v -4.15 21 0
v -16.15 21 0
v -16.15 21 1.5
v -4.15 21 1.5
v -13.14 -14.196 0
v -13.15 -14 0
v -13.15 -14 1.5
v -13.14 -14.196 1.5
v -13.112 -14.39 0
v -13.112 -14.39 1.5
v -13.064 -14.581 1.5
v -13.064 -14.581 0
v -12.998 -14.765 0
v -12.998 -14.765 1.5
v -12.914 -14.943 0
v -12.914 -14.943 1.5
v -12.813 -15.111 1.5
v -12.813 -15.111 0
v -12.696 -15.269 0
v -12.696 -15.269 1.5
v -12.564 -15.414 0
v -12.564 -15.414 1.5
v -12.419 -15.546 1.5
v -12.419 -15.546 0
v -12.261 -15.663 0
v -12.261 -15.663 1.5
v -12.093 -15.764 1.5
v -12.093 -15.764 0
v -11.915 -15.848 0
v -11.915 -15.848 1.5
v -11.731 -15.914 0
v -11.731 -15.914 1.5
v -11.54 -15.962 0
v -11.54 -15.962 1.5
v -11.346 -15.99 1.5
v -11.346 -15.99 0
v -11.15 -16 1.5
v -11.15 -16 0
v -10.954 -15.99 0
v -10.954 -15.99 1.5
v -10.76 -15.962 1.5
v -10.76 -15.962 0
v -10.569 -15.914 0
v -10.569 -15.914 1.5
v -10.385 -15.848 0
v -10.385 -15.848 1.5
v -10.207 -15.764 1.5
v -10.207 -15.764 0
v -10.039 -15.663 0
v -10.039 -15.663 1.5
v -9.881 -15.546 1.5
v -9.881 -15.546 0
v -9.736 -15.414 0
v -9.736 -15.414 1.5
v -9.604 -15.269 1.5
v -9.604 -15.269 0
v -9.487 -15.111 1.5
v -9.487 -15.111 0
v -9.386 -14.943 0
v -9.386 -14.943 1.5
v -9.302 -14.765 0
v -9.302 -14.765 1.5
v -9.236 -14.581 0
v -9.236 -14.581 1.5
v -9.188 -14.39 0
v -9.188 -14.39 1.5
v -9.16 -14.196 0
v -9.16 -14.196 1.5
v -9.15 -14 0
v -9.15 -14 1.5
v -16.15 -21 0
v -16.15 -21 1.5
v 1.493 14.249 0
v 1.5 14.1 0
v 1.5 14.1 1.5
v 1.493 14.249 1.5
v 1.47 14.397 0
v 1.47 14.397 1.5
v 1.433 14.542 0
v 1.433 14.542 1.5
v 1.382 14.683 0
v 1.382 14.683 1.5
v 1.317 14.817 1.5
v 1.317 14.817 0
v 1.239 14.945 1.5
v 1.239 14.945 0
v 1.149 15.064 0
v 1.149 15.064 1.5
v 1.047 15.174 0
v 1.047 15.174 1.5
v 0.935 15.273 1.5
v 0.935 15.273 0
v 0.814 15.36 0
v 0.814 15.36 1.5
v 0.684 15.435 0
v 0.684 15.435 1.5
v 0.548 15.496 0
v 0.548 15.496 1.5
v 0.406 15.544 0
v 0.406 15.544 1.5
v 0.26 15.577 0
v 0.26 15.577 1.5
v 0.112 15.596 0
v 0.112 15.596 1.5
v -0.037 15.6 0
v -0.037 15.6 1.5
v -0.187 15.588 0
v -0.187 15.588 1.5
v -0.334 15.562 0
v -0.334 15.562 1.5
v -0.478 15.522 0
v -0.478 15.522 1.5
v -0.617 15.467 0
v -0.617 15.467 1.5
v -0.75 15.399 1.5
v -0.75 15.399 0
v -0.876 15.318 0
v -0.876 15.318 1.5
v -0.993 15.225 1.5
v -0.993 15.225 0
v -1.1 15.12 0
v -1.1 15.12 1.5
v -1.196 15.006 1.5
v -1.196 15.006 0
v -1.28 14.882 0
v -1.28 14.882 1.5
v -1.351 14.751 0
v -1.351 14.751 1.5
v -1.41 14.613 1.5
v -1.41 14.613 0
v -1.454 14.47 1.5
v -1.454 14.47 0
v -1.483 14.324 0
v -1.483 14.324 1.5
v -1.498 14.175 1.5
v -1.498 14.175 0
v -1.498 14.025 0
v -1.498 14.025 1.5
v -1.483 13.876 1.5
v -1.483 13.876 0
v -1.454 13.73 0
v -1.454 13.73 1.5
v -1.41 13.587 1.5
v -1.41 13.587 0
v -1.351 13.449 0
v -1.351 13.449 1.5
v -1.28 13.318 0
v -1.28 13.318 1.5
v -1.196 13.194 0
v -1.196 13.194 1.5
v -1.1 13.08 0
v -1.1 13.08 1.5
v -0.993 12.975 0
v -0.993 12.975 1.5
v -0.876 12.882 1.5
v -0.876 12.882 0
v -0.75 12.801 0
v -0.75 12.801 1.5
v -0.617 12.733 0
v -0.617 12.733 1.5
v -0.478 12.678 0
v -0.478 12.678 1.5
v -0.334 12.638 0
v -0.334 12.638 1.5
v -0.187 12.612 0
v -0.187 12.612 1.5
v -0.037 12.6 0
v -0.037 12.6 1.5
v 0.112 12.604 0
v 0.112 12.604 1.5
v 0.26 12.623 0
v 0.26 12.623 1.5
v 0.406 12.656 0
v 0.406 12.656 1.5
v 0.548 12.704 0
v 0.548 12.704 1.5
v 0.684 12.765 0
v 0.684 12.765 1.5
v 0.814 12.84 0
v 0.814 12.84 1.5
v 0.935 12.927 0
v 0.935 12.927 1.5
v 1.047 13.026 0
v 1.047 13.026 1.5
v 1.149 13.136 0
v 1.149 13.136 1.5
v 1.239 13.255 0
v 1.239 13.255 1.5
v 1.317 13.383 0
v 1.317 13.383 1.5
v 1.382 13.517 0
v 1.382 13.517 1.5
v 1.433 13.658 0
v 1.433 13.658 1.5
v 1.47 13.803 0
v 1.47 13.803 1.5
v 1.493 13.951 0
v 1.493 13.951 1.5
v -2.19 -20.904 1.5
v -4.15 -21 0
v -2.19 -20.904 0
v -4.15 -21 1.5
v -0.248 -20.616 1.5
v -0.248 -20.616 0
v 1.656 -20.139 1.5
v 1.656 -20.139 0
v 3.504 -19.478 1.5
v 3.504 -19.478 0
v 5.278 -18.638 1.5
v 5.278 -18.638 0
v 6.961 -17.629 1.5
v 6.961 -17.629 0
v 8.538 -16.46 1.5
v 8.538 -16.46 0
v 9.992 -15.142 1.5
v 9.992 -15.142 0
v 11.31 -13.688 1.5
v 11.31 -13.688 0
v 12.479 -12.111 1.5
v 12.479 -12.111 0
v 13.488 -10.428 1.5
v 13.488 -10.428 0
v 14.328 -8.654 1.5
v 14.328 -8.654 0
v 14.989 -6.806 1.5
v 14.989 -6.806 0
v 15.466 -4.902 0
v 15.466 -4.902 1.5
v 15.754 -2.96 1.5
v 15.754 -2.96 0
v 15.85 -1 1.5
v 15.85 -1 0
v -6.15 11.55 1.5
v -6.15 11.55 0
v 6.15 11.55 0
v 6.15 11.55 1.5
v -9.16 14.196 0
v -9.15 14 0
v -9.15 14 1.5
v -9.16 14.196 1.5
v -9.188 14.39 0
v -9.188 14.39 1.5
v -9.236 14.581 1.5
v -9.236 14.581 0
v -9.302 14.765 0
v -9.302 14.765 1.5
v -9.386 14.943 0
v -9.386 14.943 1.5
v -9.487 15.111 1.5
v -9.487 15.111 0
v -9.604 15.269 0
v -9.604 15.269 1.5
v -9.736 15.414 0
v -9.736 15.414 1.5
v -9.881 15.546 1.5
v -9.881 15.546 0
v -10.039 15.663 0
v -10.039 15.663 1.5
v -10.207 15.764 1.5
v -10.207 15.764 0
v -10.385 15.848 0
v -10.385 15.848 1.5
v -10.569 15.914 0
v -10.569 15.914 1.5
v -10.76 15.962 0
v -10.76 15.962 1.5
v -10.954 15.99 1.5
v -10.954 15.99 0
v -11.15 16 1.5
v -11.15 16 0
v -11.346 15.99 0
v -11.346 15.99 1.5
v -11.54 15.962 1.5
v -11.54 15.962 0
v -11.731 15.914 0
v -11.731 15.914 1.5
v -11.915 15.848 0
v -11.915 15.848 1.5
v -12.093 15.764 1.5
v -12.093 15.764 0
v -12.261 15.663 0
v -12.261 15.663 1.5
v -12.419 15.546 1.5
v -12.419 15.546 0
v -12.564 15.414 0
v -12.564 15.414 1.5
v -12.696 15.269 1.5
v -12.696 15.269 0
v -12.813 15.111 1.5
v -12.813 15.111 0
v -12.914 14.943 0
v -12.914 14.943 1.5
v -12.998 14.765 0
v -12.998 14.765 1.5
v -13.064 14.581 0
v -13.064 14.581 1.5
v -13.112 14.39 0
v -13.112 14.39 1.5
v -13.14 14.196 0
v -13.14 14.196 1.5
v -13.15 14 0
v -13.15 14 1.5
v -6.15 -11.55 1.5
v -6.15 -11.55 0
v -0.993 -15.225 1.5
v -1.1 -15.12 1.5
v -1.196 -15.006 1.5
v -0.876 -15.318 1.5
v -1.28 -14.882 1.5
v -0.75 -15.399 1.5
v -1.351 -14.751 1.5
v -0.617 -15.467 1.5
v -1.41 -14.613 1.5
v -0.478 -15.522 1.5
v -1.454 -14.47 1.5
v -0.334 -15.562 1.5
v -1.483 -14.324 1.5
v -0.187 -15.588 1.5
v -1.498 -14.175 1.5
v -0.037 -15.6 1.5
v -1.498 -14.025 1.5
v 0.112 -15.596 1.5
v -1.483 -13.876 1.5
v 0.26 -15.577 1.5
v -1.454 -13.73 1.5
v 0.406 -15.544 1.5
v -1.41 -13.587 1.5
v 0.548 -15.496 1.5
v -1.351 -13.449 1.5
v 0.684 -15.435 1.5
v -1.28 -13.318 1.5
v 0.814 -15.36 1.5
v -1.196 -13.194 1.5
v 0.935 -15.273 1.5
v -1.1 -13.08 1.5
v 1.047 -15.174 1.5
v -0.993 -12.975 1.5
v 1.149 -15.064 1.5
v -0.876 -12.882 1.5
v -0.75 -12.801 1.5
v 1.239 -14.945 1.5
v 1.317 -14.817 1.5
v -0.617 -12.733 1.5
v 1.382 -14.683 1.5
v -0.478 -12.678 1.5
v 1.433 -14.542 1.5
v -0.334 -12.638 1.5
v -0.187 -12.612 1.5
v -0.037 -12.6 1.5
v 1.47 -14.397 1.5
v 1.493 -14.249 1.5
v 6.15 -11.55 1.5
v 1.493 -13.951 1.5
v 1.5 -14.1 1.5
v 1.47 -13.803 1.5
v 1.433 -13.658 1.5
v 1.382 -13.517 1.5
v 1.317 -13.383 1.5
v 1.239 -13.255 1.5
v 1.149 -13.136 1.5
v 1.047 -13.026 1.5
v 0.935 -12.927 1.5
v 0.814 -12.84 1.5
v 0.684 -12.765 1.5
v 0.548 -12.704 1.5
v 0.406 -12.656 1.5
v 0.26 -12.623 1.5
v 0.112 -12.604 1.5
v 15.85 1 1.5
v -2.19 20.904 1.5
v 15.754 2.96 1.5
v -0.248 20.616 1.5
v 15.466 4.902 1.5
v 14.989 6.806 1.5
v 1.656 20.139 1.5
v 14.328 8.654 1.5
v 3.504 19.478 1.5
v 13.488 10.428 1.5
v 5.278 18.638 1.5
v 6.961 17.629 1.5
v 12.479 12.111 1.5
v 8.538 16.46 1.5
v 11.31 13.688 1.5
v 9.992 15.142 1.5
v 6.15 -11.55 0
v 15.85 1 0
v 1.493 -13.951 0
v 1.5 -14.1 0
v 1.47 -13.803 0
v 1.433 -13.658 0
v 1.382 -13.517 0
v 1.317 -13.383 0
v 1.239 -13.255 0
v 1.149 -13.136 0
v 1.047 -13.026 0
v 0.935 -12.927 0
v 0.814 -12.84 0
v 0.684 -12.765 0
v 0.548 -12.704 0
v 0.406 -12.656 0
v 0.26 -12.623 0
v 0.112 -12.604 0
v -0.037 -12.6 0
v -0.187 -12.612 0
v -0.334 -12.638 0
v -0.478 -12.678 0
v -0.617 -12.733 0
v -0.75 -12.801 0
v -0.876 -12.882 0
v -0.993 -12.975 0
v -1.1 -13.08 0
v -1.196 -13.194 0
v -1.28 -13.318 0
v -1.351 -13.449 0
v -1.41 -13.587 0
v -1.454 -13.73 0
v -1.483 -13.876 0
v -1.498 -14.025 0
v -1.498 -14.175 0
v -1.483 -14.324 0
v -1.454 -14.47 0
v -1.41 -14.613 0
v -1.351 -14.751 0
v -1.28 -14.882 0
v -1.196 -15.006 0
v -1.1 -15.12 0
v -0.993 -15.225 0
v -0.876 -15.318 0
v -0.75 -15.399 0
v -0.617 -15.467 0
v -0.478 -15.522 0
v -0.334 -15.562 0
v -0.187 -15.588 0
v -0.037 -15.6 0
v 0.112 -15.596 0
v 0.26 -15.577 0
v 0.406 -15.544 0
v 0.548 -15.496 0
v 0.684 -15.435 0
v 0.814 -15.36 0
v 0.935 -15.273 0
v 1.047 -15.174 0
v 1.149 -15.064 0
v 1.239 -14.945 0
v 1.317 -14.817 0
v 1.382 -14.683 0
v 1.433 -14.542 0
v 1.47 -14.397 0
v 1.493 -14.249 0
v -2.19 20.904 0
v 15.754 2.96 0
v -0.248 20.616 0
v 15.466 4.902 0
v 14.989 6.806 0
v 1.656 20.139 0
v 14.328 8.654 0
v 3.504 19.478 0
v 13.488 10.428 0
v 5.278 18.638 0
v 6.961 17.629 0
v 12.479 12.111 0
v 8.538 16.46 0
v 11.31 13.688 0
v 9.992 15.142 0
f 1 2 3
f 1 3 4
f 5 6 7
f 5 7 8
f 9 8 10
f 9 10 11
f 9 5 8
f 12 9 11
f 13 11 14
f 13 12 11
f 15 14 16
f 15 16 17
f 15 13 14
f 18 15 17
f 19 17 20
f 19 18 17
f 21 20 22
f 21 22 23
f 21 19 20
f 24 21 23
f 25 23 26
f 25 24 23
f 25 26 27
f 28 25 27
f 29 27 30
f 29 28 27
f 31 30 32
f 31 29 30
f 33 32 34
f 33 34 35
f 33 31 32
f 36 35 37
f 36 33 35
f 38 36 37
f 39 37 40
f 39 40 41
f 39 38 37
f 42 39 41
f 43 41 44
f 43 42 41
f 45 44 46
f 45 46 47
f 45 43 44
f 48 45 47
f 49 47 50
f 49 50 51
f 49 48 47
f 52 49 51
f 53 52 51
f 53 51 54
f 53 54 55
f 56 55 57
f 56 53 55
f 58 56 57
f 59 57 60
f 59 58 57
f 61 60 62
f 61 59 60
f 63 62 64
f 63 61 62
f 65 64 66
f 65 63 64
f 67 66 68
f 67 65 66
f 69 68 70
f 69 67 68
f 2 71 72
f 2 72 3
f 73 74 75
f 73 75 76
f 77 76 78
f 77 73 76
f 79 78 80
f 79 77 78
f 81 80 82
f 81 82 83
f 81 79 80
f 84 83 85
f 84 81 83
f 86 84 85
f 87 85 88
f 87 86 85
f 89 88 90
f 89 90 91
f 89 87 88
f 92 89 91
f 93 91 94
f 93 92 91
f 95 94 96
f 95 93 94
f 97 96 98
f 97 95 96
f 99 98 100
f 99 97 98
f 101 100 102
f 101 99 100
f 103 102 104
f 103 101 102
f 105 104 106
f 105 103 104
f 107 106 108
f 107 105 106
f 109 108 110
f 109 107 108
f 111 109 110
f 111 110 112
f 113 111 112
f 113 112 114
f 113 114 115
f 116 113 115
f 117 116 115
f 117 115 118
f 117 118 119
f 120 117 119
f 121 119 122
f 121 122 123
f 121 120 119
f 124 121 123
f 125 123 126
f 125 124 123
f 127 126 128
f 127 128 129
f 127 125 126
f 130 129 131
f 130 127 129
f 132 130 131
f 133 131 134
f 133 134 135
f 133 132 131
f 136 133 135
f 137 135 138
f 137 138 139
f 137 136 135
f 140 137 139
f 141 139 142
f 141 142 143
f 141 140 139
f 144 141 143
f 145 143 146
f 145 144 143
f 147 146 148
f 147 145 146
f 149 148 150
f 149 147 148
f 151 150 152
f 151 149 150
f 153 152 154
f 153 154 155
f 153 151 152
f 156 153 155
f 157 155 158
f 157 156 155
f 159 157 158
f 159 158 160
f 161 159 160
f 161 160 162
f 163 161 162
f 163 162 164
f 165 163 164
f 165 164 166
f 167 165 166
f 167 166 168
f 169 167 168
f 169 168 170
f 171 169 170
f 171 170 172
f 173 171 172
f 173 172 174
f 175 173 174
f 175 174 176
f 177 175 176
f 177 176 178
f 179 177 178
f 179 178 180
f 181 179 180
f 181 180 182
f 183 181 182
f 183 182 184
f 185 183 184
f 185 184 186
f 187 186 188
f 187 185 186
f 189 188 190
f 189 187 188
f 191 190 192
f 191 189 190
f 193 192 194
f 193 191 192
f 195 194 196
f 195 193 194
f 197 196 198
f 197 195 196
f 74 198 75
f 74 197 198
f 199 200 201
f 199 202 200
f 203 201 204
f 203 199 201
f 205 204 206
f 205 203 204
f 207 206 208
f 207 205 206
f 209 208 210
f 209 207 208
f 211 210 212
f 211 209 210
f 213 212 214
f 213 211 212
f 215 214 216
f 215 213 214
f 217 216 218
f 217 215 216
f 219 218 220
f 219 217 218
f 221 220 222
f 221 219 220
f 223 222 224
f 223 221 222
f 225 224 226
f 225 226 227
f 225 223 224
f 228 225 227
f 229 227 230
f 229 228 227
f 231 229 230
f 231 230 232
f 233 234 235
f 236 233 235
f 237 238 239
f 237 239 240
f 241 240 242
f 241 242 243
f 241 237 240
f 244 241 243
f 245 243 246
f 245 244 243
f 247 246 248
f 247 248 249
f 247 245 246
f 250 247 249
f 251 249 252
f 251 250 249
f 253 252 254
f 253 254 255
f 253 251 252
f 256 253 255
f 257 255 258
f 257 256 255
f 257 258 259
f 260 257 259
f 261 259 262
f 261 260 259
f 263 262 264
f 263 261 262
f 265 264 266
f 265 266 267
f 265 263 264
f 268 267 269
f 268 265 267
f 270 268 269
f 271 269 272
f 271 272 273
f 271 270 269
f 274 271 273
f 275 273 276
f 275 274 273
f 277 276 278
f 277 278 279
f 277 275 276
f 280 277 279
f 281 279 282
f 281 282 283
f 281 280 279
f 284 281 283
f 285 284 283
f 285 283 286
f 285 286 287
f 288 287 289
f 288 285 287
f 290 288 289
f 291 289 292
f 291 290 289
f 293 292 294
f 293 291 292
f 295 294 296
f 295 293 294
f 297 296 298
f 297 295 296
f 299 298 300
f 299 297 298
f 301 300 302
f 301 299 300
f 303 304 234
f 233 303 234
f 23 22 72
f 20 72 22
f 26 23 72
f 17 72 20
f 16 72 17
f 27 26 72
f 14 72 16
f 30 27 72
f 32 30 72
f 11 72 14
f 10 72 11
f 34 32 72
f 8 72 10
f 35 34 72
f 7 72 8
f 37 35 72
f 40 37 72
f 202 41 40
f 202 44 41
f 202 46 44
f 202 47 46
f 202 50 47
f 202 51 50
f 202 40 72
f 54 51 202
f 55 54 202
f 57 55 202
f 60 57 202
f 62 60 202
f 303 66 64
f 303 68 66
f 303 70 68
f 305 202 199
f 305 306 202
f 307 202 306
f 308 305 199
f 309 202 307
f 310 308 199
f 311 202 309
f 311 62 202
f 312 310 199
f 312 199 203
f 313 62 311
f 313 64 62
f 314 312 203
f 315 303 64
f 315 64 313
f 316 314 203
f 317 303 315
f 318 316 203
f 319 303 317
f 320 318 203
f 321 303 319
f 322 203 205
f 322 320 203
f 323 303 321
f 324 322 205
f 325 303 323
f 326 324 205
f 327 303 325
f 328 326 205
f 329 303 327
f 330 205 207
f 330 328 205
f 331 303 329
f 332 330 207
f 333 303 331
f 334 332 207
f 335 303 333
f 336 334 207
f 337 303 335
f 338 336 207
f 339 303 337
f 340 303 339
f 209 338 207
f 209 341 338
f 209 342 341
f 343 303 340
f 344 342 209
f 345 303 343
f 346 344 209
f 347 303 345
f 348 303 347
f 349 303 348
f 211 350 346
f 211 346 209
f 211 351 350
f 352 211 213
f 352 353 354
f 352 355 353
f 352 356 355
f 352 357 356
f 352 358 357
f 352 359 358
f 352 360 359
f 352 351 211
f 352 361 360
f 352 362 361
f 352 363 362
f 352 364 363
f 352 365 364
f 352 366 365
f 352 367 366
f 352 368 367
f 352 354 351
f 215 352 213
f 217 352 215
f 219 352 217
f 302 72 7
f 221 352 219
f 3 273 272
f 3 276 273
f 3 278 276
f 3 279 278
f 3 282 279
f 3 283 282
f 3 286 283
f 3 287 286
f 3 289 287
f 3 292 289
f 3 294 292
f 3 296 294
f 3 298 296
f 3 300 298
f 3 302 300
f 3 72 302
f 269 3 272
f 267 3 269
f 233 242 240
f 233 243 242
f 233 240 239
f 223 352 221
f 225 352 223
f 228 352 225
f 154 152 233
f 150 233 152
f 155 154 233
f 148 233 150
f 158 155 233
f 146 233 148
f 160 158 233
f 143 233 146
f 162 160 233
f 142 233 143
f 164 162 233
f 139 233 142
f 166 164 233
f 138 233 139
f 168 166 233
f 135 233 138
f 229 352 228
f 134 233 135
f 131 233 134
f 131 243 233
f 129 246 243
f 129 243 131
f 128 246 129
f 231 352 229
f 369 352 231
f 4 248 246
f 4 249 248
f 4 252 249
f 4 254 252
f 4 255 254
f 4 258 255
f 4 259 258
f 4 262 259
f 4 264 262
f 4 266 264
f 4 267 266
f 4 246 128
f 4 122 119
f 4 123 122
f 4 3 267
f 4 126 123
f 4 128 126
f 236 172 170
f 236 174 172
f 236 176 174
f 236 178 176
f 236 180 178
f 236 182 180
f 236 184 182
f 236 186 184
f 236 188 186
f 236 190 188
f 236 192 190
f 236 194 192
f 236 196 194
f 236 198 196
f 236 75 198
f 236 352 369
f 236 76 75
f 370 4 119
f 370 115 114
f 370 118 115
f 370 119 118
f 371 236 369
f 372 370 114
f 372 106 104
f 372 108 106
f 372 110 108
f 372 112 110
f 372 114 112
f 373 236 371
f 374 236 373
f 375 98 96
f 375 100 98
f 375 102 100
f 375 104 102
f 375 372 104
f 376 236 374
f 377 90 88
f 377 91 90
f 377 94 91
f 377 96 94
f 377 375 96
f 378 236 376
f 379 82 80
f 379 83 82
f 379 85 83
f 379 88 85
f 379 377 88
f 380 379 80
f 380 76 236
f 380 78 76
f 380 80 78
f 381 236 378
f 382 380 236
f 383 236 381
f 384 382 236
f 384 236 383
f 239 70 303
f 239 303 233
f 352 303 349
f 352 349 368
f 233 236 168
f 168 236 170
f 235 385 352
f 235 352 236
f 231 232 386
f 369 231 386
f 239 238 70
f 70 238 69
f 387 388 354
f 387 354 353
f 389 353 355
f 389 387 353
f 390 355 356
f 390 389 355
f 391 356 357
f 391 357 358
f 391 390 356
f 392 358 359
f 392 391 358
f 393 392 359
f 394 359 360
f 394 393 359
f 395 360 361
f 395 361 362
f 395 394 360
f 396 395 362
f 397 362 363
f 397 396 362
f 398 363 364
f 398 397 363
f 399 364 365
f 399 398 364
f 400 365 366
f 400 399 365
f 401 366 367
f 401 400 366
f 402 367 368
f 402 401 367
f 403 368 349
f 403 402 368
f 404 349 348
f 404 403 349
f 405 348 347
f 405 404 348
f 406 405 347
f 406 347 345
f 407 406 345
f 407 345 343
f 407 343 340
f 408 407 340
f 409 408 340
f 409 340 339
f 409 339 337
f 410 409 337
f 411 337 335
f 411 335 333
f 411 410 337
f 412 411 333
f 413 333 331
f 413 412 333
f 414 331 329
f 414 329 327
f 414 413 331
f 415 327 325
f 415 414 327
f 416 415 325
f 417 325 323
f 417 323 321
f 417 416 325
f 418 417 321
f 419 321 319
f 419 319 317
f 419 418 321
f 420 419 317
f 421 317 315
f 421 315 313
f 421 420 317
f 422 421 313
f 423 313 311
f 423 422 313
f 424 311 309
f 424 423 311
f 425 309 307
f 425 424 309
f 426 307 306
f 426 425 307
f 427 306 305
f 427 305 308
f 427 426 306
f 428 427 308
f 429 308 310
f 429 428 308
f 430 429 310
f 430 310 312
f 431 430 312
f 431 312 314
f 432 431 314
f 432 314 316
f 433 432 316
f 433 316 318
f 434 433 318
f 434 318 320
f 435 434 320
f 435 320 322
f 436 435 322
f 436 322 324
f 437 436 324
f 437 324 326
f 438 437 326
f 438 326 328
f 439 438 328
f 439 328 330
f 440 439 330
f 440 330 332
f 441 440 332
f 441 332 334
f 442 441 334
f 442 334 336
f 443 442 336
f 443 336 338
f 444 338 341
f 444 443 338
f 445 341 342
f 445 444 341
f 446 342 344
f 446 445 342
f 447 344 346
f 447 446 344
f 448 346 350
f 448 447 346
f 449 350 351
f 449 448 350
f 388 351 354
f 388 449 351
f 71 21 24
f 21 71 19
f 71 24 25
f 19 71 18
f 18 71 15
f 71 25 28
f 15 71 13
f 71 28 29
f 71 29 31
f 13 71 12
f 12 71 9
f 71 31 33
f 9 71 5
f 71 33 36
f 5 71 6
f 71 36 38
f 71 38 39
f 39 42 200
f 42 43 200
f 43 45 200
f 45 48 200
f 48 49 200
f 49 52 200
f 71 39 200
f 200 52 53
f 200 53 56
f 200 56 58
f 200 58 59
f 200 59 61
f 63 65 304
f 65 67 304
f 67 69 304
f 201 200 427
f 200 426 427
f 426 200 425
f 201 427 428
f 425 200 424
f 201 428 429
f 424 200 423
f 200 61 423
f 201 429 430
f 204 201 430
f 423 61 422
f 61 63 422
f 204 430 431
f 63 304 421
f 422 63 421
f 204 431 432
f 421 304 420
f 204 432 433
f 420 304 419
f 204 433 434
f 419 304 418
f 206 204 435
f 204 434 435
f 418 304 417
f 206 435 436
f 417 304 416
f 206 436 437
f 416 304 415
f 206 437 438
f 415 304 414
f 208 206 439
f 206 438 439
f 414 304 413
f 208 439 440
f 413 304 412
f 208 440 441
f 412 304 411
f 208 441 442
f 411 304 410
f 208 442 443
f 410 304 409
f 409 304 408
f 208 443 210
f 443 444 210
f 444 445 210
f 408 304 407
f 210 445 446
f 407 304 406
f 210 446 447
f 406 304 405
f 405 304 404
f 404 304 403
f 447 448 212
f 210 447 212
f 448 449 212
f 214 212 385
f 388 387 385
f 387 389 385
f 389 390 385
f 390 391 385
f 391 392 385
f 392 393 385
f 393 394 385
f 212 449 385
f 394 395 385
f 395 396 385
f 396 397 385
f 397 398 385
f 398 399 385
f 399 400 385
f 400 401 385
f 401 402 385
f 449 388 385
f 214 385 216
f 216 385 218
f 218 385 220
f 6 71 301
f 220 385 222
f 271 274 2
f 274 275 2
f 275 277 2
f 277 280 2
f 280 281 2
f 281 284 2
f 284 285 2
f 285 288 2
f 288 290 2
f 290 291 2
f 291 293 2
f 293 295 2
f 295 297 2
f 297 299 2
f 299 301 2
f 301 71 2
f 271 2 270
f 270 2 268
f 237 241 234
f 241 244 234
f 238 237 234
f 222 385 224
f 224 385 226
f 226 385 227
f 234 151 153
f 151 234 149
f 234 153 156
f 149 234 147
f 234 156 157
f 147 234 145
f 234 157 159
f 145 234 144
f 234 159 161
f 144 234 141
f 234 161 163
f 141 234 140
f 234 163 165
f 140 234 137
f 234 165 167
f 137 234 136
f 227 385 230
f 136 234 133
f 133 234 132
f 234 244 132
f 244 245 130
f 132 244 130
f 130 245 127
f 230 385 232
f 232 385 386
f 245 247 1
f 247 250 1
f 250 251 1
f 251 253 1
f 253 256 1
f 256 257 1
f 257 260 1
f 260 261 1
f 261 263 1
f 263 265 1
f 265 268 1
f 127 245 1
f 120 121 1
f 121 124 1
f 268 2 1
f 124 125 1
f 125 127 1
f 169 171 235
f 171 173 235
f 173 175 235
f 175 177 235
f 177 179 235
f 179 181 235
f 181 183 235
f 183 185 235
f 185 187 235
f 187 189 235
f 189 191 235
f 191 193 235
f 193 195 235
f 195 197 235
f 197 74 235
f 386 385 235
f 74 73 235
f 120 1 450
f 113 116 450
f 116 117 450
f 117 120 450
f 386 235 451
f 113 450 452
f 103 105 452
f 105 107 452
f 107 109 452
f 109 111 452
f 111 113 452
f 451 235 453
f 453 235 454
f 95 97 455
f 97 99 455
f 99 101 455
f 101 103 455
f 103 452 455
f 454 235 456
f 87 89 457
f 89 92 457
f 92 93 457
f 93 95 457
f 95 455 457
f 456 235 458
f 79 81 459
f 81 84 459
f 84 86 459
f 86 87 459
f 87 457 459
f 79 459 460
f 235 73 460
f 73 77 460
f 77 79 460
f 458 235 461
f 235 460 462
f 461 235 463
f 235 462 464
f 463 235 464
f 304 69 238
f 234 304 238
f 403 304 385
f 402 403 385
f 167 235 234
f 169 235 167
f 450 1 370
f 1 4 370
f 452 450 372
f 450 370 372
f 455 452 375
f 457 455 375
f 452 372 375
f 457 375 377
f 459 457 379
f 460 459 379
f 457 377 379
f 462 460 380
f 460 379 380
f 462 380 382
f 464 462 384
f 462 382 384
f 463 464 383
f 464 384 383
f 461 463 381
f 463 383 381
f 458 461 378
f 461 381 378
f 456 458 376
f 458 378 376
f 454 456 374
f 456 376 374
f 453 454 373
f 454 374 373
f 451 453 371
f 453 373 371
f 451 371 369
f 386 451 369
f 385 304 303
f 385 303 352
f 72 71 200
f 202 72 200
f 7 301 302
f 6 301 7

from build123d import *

# Parameters (mm, degrees)
SKETCH001_W   = 32
SKETCH001_H   = 42
SKETCH001_R   = 1.5
SKETCH001_W_2 = 12.3
SKETCH001_H_2 = 23.1
EXTRUDE_DEPTH = 1.5
FILLET_R      = 20


with BuildPart() as part:
    # Sketch001 → Extrude (new body)
    with BuildSketch(Plane.XY):
        with Locations((-0.15, 0)):
            Rectangle(SKETCH001_W, SKETCH001_H)
        with Locations((0, 14.1)):
            Circle(SKETCH001_R, mode=Mode.SUBTRACT)
        with Locations((0, -14.1)):
            Circle(SKETCH001_R, mode=Mode.SUBTRACT)
        Rectangle(SKETCH001_W_2, SKETCH001_H_2, mode=Mode.SUBTRACT)
        with BuildLine():
            ThreePointArc((-9.15, 14), (-11.15, 16), (-13.15, 14))
            Line((-13.15, 14), (-13.15, -14))
            ThreePointArc((-13.15, -14), (-11.15, -16), (-9.15, -14))
            Line((-9.15, 14), (-9.15, -14))
        make_face(mode=Mode.SUBTRACT)
    extrude(amount=EXTRUDE_DEPTH)

    # Fillet
    fillet_edges = [part.edges().sort_by_distance(p)[0] for p in [
        (15.85, 21, 0.75),
        (15.85, -21, 0.75),
    ]]
    fillet(fillet_edges, radius=FILLET_R)


solid = part.part
